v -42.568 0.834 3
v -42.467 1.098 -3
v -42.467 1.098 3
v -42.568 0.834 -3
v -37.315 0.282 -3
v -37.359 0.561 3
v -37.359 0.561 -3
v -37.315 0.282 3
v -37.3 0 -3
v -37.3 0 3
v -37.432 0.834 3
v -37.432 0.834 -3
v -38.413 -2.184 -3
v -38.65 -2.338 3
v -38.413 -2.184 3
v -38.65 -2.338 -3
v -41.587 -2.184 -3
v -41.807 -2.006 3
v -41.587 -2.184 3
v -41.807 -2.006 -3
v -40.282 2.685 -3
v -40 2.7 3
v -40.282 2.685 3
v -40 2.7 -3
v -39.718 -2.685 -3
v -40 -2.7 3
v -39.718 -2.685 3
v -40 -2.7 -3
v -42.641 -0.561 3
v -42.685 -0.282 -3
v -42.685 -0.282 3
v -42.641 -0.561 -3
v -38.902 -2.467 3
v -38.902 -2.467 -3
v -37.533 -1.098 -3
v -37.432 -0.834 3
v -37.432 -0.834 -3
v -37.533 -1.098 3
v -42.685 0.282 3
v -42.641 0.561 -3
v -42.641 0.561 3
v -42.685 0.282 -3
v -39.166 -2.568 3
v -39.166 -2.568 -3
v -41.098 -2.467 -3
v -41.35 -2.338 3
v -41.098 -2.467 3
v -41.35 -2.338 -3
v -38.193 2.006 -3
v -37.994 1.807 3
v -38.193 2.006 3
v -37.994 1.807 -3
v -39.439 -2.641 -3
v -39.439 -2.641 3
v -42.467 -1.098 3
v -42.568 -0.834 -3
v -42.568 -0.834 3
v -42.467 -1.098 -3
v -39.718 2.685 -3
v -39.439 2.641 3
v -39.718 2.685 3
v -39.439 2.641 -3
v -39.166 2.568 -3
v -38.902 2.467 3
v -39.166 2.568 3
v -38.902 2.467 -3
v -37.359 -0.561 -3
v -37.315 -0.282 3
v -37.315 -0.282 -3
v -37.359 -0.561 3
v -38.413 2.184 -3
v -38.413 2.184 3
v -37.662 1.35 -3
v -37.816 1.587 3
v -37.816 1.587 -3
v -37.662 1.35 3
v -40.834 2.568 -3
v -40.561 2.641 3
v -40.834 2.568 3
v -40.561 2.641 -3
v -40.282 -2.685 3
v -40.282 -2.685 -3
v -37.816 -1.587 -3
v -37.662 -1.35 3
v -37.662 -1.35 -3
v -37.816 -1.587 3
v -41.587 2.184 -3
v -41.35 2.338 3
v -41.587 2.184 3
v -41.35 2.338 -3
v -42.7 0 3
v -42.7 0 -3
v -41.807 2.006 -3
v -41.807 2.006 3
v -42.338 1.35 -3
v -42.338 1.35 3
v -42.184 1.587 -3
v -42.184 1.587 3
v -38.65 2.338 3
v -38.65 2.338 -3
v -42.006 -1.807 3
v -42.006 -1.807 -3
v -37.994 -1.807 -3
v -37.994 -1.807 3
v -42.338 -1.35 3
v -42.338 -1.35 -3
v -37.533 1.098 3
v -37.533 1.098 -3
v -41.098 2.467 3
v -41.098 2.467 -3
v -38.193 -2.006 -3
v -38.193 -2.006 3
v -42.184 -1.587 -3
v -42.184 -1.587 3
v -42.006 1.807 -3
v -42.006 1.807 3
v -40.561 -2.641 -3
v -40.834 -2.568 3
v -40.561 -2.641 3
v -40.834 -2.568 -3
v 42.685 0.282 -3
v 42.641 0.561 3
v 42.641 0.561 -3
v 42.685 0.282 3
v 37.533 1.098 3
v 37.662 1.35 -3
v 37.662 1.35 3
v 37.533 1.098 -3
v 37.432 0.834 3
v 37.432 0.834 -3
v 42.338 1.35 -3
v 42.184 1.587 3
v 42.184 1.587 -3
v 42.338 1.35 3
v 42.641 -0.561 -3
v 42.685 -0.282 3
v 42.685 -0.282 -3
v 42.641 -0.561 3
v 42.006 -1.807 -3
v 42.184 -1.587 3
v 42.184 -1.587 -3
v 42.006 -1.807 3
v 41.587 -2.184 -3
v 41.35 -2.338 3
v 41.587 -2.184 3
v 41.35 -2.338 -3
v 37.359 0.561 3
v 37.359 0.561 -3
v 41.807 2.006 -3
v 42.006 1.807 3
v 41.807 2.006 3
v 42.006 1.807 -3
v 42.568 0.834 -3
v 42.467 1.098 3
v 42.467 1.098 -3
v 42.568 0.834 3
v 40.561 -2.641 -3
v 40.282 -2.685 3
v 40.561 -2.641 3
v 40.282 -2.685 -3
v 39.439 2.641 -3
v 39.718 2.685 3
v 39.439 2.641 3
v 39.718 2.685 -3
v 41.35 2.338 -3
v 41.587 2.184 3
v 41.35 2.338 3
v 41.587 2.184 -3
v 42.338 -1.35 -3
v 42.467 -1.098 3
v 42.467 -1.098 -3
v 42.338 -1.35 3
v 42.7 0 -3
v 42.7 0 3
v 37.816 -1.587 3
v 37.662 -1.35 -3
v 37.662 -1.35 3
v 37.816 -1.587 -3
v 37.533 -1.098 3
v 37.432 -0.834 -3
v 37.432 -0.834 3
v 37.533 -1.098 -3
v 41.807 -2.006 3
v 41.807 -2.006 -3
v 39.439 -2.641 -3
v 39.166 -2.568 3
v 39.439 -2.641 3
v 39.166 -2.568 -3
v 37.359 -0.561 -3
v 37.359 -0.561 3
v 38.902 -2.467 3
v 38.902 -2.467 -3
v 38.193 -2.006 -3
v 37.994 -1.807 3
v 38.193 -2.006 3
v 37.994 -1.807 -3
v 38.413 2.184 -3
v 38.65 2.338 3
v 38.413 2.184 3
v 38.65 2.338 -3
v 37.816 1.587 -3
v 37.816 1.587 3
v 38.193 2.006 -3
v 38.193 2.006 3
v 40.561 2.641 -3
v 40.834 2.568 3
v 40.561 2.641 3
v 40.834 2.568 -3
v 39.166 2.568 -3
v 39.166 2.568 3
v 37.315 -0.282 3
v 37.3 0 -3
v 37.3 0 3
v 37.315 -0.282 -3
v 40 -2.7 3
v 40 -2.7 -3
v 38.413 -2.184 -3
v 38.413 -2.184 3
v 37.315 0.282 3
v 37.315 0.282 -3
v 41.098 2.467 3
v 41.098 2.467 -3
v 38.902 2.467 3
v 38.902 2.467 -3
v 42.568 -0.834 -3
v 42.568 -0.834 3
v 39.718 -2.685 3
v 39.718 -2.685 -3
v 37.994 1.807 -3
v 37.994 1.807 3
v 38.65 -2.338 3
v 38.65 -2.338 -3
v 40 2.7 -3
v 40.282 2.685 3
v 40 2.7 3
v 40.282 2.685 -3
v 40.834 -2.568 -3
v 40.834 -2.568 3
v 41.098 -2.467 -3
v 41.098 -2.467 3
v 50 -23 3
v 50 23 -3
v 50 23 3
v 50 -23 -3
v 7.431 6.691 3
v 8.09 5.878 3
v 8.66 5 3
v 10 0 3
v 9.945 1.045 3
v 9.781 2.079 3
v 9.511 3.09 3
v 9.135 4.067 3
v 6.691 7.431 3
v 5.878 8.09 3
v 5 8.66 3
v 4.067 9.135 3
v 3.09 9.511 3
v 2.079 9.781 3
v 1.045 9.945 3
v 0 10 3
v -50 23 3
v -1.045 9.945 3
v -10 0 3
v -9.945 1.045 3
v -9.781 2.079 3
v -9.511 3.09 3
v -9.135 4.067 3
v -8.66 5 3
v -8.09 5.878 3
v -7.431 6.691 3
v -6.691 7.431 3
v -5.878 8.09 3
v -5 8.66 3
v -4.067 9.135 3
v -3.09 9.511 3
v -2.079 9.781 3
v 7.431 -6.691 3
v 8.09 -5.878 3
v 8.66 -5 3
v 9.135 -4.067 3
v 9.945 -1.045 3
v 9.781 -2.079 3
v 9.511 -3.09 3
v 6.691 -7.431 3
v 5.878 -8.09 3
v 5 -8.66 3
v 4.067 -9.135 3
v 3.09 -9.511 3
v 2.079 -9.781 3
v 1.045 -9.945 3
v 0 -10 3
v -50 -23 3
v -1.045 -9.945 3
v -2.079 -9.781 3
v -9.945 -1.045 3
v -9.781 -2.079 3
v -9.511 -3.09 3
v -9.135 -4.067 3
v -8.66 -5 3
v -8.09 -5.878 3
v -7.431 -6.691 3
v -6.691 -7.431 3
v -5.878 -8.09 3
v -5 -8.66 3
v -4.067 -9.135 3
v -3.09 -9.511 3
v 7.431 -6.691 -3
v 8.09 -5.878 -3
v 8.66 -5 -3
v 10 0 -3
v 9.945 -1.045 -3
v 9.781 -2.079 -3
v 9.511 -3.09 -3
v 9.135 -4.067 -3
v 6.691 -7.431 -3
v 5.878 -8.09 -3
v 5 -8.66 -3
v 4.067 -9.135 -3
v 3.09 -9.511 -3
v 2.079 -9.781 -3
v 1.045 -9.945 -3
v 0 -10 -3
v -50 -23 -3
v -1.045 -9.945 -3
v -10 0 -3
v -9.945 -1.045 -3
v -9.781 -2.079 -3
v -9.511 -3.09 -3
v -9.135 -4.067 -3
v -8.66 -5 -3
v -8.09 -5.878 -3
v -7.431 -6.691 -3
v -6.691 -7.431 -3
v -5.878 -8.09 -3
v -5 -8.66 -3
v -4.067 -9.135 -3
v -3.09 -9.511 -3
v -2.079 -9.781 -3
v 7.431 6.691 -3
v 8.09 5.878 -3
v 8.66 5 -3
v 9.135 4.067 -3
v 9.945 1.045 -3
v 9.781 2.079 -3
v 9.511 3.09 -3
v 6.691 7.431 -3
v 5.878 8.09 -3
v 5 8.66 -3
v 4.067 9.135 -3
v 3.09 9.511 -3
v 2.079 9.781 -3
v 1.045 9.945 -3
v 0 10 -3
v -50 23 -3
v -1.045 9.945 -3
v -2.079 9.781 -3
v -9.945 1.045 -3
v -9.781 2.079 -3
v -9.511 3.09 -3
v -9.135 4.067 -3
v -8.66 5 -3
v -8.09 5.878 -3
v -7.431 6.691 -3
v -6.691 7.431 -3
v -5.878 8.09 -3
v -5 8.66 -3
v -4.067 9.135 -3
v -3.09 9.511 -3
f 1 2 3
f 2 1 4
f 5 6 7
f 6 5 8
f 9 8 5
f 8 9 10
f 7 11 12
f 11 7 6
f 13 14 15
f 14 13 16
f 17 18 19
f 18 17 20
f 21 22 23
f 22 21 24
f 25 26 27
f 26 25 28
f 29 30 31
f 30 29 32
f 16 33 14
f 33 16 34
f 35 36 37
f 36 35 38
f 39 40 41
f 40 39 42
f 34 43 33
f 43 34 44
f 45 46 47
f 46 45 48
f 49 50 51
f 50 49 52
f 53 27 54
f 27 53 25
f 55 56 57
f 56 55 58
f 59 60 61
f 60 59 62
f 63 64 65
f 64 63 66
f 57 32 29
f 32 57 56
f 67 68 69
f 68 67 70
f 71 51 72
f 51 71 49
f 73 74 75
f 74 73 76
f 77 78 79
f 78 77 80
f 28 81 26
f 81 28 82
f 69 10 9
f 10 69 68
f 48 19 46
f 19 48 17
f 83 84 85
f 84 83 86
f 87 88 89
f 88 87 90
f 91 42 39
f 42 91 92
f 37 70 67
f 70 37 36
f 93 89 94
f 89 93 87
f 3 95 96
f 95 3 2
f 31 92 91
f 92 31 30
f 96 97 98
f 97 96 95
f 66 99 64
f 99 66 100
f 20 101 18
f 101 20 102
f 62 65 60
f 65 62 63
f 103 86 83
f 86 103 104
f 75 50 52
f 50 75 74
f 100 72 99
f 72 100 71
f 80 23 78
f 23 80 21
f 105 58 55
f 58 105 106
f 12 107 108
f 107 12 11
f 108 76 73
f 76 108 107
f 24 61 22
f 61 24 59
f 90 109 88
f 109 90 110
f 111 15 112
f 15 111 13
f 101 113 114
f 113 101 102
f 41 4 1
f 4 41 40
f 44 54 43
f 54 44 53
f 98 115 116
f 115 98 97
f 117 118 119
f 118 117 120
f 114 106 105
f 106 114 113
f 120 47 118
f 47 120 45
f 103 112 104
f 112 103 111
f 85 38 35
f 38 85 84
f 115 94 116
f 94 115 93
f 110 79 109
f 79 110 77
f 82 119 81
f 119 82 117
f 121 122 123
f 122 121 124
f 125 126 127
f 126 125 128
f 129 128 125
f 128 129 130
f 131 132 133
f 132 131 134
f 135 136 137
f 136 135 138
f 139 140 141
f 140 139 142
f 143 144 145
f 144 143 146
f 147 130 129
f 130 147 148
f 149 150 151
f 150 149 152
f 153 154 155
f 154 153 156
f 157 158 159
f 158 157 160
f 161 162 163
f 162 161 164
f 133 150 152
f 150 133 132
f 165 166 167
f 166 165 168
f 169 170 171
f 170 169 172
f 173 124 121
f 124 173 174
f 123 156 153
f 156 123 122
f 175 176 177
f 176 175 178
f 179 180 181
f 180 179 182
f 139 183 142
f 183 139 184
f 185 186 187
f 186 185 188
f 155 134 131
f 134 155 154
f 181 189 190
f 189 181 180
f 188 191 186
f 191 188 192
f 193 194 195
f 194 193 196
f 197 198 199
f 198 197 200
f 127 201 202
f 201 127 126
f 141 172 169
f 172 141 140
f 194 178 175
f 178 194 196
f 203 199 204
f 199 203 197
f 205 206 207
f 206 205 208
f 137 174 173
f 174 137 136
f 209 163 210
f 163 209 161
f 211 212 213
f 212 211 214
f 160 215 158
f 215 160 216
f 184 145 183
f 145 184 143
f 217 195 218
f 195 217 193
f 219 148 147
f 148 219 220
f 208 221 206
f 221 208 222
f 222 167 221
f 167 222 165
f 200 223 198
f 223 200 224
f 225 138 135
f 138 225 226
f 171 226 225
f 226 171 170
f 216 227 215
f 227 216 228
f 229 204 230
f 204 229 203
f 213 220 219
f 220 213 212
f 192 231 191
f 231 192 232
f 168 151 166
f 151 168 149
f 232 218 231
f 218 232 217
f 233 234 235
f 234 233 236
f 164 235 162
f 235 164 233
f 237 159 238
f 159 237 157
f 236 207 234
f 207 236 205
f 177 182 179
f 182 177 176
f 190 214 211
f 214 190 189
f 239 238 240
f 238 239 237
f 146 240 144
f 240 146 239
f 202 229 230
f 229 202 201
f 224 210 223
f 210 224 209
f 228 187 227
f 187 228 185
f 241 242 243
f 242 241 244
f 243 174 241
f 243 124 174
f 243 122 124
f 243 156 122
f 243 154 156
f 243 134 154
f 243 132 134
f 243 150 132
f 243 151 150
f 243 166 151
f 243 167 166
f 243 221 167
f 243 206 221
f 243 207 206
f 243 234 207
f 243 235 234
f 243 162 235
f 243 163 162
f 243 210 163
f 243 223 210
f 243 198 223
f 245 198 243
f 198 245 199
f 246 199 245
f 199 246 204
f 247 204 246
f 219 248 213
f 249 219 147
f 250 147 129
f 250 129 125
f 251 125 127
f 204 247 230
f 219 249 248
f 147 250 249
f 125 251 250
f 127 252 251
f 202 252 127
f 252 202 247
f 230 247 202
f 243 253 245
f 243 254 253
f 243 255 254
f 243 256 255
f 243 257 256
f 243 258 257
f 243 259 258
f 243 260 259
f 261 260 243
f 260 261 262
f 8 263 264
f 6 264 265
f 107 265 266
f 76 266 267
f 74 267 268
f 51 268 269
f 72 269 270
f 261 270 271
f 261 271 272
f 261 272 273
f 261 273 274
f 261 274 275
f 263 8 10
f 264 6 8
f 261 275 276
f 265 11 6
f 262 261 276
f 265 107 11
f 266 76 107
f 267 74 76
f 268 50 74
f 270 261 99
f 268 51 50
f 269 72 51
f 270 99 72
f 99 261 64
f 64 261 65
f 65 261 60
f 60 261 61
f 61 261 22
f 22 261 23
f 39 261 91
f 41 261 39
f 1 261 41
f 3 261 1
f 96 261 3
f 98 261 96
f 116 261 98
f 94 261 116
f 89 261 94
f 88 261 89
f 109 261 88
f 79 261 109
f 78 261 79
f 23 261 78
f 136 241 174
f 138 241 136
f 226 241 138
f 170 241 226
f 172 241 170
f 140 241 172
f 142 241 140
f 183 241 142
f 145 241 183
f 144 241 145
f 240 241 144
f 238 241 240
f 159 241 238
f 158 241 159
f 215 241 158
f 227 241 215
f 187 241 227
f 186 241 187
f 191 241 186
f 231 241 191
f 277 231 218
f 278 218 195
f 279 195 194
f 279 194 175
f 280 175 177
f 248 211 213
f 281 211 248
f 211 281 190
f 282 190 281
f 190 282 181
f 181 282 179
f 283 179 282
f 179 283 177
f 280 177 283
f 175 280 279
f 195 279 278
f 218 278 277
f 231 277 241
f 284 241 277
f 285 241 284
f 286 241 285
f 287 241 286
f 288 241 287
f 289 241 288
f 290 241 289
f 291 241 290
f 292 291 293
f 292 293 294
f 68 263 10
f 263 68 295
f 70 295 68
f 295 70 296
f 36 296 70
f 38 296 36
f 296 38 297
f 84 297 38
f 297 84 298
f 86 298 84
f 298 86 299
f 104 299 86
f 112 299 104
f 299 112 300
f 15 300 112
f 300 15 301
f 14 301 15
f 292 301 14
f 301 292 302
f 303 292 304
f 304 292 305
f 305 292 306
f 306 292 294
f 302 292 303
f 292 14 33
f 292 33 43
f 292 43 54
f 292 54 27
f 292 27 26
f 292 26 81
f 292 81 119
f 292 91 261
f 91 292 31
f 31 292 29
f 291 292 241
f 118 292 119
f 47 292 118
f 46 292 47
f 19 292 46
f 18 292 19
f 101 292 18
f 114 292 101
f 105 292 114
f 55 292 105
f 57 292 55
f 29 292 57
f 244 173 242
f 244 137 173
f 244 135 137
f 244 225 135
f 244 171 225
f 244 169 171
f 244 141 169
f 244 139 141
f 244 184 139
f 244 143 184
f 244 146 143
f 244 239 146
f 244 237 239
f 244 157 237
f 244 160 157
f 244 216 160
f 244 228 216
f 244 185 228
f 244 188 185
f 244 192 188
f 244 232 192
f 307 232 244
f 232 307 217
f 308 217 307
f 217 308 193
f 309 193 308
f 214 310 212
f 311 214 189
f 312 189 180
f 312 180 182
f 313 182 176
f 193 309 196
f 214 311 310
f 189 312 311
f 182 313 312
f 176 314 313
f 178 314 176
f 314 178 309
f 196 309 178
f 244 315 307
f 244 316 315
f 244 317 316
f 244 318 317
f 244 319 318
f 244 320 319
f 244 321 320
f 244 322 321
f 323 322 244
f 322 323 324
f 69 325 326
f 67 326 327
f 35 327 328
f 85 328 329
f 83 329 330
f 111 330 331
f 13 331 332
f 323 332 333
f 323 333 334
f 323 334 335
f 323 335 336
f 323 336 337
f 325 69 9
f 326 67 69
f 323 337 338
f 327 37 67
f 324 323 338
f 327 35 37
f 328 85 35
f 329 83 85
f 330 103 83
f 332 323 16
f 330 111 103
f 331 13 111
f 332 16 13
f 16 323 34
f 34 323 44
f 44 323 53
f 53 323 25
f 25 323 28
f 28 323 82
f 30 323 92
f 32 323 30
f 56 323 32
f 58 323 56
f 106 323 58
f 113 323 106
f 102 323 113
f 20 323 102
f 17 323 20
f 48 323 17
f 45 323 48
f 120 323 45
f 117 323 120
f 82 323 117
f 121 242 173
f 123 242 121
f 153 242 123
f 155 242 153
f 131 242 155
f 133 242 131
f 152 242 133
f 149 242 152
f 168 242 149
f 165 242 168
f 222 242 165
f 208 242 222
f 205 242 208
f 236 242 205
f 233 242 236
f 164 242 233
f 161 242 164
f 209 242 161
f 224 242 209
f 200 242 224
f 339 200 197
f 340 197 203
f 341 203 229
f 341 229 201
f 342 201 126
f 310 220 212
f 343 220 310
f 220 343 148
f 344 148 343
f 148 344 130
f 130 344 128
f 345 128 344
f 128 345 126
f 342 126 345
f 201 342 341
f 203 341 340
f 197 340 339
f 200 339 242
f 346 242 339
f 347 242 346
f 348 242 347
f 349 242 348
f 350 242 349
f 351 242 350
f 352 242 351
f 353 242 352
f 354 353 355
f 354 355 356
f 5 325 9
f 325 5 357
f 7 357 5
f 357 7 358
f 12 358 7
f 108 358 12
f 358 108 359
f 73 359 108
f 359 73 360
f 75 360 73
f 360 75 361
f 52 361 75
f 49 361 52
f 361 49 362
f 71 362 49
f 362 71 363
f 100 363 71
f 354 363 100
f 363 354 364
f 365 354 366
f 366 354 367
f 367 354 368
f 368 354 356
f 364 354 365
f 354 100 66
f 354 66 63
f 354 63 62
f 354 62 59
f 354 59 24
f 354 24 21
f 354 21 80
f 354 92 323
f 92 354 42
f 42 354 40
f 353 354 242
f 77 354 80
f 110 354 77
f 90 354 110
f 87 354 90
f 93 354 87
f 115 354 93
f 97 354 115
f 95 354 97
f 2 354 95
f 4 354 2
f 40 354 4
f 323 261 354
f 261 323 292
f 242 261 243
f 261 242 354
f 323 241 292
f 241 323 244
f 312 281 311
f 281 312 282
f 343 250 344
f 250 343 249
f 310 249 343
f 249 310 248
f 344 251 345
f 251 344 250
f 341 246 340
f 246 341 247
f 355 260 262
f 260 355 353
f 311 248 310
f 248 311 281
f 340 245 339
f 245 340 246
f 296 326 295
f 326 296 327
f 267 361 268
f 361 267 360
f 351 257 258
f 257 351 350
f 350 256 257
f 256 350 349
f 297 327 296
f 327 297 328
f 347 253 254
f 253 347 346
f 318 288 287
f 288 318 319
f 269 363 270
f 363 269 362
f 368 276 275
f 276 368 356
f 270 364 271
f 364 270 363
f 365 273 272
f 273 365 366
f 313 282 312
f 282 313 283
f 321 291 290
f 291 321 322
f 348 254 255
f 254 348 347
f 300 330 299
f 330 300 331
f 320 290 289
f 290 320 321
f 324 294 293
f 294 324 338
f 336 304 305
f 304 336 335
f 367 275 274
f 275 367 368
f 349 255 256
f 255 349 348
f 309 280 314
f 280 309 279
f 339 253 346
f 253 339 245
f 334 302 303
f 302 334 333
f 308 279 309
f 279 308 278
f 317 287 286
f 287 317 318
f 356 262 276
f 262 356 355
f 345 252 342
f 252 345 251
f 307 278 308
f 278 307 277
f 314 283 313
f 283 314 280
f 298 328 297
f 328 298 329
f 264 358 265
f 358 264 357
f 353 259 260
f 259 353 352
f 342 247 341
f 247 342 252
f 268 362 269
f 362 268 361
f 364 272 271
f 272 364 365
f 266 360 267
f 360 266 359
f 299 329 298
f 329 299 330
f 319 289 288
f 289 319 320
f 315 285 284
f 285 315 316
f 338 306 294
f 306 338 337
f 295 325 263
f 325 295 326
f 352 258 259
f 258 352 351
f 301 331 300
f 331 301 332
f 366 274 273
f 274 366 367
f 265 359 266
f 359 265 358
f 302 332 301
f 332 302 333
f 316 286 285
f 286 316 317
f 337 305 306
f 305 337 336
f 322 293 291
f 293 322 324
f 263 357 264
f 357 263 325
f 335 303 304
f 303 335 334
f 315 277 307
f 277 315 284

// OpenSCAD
// Rod-end mounting plate.
$fn = 60;
eps = 0.02;
plate_l = 100;
plate_w = 46;
plate_t = 6;
bore_d = 20;
difference() {
    cube([plate_l, plate_w, plate_t], center = true);
    translate([0, 0, -plate_t / 2 - eps]) cylinder(d = bore_d, h = plate_t + 2 * eps);
    for (x = [-plate_l / 2 + 10, plate_l / 2 - 10])
        translate([x, 0, -plate_t / 2 - eps]) cylinder(d = 5.4, h = plate_t + 2 * eps);
}
